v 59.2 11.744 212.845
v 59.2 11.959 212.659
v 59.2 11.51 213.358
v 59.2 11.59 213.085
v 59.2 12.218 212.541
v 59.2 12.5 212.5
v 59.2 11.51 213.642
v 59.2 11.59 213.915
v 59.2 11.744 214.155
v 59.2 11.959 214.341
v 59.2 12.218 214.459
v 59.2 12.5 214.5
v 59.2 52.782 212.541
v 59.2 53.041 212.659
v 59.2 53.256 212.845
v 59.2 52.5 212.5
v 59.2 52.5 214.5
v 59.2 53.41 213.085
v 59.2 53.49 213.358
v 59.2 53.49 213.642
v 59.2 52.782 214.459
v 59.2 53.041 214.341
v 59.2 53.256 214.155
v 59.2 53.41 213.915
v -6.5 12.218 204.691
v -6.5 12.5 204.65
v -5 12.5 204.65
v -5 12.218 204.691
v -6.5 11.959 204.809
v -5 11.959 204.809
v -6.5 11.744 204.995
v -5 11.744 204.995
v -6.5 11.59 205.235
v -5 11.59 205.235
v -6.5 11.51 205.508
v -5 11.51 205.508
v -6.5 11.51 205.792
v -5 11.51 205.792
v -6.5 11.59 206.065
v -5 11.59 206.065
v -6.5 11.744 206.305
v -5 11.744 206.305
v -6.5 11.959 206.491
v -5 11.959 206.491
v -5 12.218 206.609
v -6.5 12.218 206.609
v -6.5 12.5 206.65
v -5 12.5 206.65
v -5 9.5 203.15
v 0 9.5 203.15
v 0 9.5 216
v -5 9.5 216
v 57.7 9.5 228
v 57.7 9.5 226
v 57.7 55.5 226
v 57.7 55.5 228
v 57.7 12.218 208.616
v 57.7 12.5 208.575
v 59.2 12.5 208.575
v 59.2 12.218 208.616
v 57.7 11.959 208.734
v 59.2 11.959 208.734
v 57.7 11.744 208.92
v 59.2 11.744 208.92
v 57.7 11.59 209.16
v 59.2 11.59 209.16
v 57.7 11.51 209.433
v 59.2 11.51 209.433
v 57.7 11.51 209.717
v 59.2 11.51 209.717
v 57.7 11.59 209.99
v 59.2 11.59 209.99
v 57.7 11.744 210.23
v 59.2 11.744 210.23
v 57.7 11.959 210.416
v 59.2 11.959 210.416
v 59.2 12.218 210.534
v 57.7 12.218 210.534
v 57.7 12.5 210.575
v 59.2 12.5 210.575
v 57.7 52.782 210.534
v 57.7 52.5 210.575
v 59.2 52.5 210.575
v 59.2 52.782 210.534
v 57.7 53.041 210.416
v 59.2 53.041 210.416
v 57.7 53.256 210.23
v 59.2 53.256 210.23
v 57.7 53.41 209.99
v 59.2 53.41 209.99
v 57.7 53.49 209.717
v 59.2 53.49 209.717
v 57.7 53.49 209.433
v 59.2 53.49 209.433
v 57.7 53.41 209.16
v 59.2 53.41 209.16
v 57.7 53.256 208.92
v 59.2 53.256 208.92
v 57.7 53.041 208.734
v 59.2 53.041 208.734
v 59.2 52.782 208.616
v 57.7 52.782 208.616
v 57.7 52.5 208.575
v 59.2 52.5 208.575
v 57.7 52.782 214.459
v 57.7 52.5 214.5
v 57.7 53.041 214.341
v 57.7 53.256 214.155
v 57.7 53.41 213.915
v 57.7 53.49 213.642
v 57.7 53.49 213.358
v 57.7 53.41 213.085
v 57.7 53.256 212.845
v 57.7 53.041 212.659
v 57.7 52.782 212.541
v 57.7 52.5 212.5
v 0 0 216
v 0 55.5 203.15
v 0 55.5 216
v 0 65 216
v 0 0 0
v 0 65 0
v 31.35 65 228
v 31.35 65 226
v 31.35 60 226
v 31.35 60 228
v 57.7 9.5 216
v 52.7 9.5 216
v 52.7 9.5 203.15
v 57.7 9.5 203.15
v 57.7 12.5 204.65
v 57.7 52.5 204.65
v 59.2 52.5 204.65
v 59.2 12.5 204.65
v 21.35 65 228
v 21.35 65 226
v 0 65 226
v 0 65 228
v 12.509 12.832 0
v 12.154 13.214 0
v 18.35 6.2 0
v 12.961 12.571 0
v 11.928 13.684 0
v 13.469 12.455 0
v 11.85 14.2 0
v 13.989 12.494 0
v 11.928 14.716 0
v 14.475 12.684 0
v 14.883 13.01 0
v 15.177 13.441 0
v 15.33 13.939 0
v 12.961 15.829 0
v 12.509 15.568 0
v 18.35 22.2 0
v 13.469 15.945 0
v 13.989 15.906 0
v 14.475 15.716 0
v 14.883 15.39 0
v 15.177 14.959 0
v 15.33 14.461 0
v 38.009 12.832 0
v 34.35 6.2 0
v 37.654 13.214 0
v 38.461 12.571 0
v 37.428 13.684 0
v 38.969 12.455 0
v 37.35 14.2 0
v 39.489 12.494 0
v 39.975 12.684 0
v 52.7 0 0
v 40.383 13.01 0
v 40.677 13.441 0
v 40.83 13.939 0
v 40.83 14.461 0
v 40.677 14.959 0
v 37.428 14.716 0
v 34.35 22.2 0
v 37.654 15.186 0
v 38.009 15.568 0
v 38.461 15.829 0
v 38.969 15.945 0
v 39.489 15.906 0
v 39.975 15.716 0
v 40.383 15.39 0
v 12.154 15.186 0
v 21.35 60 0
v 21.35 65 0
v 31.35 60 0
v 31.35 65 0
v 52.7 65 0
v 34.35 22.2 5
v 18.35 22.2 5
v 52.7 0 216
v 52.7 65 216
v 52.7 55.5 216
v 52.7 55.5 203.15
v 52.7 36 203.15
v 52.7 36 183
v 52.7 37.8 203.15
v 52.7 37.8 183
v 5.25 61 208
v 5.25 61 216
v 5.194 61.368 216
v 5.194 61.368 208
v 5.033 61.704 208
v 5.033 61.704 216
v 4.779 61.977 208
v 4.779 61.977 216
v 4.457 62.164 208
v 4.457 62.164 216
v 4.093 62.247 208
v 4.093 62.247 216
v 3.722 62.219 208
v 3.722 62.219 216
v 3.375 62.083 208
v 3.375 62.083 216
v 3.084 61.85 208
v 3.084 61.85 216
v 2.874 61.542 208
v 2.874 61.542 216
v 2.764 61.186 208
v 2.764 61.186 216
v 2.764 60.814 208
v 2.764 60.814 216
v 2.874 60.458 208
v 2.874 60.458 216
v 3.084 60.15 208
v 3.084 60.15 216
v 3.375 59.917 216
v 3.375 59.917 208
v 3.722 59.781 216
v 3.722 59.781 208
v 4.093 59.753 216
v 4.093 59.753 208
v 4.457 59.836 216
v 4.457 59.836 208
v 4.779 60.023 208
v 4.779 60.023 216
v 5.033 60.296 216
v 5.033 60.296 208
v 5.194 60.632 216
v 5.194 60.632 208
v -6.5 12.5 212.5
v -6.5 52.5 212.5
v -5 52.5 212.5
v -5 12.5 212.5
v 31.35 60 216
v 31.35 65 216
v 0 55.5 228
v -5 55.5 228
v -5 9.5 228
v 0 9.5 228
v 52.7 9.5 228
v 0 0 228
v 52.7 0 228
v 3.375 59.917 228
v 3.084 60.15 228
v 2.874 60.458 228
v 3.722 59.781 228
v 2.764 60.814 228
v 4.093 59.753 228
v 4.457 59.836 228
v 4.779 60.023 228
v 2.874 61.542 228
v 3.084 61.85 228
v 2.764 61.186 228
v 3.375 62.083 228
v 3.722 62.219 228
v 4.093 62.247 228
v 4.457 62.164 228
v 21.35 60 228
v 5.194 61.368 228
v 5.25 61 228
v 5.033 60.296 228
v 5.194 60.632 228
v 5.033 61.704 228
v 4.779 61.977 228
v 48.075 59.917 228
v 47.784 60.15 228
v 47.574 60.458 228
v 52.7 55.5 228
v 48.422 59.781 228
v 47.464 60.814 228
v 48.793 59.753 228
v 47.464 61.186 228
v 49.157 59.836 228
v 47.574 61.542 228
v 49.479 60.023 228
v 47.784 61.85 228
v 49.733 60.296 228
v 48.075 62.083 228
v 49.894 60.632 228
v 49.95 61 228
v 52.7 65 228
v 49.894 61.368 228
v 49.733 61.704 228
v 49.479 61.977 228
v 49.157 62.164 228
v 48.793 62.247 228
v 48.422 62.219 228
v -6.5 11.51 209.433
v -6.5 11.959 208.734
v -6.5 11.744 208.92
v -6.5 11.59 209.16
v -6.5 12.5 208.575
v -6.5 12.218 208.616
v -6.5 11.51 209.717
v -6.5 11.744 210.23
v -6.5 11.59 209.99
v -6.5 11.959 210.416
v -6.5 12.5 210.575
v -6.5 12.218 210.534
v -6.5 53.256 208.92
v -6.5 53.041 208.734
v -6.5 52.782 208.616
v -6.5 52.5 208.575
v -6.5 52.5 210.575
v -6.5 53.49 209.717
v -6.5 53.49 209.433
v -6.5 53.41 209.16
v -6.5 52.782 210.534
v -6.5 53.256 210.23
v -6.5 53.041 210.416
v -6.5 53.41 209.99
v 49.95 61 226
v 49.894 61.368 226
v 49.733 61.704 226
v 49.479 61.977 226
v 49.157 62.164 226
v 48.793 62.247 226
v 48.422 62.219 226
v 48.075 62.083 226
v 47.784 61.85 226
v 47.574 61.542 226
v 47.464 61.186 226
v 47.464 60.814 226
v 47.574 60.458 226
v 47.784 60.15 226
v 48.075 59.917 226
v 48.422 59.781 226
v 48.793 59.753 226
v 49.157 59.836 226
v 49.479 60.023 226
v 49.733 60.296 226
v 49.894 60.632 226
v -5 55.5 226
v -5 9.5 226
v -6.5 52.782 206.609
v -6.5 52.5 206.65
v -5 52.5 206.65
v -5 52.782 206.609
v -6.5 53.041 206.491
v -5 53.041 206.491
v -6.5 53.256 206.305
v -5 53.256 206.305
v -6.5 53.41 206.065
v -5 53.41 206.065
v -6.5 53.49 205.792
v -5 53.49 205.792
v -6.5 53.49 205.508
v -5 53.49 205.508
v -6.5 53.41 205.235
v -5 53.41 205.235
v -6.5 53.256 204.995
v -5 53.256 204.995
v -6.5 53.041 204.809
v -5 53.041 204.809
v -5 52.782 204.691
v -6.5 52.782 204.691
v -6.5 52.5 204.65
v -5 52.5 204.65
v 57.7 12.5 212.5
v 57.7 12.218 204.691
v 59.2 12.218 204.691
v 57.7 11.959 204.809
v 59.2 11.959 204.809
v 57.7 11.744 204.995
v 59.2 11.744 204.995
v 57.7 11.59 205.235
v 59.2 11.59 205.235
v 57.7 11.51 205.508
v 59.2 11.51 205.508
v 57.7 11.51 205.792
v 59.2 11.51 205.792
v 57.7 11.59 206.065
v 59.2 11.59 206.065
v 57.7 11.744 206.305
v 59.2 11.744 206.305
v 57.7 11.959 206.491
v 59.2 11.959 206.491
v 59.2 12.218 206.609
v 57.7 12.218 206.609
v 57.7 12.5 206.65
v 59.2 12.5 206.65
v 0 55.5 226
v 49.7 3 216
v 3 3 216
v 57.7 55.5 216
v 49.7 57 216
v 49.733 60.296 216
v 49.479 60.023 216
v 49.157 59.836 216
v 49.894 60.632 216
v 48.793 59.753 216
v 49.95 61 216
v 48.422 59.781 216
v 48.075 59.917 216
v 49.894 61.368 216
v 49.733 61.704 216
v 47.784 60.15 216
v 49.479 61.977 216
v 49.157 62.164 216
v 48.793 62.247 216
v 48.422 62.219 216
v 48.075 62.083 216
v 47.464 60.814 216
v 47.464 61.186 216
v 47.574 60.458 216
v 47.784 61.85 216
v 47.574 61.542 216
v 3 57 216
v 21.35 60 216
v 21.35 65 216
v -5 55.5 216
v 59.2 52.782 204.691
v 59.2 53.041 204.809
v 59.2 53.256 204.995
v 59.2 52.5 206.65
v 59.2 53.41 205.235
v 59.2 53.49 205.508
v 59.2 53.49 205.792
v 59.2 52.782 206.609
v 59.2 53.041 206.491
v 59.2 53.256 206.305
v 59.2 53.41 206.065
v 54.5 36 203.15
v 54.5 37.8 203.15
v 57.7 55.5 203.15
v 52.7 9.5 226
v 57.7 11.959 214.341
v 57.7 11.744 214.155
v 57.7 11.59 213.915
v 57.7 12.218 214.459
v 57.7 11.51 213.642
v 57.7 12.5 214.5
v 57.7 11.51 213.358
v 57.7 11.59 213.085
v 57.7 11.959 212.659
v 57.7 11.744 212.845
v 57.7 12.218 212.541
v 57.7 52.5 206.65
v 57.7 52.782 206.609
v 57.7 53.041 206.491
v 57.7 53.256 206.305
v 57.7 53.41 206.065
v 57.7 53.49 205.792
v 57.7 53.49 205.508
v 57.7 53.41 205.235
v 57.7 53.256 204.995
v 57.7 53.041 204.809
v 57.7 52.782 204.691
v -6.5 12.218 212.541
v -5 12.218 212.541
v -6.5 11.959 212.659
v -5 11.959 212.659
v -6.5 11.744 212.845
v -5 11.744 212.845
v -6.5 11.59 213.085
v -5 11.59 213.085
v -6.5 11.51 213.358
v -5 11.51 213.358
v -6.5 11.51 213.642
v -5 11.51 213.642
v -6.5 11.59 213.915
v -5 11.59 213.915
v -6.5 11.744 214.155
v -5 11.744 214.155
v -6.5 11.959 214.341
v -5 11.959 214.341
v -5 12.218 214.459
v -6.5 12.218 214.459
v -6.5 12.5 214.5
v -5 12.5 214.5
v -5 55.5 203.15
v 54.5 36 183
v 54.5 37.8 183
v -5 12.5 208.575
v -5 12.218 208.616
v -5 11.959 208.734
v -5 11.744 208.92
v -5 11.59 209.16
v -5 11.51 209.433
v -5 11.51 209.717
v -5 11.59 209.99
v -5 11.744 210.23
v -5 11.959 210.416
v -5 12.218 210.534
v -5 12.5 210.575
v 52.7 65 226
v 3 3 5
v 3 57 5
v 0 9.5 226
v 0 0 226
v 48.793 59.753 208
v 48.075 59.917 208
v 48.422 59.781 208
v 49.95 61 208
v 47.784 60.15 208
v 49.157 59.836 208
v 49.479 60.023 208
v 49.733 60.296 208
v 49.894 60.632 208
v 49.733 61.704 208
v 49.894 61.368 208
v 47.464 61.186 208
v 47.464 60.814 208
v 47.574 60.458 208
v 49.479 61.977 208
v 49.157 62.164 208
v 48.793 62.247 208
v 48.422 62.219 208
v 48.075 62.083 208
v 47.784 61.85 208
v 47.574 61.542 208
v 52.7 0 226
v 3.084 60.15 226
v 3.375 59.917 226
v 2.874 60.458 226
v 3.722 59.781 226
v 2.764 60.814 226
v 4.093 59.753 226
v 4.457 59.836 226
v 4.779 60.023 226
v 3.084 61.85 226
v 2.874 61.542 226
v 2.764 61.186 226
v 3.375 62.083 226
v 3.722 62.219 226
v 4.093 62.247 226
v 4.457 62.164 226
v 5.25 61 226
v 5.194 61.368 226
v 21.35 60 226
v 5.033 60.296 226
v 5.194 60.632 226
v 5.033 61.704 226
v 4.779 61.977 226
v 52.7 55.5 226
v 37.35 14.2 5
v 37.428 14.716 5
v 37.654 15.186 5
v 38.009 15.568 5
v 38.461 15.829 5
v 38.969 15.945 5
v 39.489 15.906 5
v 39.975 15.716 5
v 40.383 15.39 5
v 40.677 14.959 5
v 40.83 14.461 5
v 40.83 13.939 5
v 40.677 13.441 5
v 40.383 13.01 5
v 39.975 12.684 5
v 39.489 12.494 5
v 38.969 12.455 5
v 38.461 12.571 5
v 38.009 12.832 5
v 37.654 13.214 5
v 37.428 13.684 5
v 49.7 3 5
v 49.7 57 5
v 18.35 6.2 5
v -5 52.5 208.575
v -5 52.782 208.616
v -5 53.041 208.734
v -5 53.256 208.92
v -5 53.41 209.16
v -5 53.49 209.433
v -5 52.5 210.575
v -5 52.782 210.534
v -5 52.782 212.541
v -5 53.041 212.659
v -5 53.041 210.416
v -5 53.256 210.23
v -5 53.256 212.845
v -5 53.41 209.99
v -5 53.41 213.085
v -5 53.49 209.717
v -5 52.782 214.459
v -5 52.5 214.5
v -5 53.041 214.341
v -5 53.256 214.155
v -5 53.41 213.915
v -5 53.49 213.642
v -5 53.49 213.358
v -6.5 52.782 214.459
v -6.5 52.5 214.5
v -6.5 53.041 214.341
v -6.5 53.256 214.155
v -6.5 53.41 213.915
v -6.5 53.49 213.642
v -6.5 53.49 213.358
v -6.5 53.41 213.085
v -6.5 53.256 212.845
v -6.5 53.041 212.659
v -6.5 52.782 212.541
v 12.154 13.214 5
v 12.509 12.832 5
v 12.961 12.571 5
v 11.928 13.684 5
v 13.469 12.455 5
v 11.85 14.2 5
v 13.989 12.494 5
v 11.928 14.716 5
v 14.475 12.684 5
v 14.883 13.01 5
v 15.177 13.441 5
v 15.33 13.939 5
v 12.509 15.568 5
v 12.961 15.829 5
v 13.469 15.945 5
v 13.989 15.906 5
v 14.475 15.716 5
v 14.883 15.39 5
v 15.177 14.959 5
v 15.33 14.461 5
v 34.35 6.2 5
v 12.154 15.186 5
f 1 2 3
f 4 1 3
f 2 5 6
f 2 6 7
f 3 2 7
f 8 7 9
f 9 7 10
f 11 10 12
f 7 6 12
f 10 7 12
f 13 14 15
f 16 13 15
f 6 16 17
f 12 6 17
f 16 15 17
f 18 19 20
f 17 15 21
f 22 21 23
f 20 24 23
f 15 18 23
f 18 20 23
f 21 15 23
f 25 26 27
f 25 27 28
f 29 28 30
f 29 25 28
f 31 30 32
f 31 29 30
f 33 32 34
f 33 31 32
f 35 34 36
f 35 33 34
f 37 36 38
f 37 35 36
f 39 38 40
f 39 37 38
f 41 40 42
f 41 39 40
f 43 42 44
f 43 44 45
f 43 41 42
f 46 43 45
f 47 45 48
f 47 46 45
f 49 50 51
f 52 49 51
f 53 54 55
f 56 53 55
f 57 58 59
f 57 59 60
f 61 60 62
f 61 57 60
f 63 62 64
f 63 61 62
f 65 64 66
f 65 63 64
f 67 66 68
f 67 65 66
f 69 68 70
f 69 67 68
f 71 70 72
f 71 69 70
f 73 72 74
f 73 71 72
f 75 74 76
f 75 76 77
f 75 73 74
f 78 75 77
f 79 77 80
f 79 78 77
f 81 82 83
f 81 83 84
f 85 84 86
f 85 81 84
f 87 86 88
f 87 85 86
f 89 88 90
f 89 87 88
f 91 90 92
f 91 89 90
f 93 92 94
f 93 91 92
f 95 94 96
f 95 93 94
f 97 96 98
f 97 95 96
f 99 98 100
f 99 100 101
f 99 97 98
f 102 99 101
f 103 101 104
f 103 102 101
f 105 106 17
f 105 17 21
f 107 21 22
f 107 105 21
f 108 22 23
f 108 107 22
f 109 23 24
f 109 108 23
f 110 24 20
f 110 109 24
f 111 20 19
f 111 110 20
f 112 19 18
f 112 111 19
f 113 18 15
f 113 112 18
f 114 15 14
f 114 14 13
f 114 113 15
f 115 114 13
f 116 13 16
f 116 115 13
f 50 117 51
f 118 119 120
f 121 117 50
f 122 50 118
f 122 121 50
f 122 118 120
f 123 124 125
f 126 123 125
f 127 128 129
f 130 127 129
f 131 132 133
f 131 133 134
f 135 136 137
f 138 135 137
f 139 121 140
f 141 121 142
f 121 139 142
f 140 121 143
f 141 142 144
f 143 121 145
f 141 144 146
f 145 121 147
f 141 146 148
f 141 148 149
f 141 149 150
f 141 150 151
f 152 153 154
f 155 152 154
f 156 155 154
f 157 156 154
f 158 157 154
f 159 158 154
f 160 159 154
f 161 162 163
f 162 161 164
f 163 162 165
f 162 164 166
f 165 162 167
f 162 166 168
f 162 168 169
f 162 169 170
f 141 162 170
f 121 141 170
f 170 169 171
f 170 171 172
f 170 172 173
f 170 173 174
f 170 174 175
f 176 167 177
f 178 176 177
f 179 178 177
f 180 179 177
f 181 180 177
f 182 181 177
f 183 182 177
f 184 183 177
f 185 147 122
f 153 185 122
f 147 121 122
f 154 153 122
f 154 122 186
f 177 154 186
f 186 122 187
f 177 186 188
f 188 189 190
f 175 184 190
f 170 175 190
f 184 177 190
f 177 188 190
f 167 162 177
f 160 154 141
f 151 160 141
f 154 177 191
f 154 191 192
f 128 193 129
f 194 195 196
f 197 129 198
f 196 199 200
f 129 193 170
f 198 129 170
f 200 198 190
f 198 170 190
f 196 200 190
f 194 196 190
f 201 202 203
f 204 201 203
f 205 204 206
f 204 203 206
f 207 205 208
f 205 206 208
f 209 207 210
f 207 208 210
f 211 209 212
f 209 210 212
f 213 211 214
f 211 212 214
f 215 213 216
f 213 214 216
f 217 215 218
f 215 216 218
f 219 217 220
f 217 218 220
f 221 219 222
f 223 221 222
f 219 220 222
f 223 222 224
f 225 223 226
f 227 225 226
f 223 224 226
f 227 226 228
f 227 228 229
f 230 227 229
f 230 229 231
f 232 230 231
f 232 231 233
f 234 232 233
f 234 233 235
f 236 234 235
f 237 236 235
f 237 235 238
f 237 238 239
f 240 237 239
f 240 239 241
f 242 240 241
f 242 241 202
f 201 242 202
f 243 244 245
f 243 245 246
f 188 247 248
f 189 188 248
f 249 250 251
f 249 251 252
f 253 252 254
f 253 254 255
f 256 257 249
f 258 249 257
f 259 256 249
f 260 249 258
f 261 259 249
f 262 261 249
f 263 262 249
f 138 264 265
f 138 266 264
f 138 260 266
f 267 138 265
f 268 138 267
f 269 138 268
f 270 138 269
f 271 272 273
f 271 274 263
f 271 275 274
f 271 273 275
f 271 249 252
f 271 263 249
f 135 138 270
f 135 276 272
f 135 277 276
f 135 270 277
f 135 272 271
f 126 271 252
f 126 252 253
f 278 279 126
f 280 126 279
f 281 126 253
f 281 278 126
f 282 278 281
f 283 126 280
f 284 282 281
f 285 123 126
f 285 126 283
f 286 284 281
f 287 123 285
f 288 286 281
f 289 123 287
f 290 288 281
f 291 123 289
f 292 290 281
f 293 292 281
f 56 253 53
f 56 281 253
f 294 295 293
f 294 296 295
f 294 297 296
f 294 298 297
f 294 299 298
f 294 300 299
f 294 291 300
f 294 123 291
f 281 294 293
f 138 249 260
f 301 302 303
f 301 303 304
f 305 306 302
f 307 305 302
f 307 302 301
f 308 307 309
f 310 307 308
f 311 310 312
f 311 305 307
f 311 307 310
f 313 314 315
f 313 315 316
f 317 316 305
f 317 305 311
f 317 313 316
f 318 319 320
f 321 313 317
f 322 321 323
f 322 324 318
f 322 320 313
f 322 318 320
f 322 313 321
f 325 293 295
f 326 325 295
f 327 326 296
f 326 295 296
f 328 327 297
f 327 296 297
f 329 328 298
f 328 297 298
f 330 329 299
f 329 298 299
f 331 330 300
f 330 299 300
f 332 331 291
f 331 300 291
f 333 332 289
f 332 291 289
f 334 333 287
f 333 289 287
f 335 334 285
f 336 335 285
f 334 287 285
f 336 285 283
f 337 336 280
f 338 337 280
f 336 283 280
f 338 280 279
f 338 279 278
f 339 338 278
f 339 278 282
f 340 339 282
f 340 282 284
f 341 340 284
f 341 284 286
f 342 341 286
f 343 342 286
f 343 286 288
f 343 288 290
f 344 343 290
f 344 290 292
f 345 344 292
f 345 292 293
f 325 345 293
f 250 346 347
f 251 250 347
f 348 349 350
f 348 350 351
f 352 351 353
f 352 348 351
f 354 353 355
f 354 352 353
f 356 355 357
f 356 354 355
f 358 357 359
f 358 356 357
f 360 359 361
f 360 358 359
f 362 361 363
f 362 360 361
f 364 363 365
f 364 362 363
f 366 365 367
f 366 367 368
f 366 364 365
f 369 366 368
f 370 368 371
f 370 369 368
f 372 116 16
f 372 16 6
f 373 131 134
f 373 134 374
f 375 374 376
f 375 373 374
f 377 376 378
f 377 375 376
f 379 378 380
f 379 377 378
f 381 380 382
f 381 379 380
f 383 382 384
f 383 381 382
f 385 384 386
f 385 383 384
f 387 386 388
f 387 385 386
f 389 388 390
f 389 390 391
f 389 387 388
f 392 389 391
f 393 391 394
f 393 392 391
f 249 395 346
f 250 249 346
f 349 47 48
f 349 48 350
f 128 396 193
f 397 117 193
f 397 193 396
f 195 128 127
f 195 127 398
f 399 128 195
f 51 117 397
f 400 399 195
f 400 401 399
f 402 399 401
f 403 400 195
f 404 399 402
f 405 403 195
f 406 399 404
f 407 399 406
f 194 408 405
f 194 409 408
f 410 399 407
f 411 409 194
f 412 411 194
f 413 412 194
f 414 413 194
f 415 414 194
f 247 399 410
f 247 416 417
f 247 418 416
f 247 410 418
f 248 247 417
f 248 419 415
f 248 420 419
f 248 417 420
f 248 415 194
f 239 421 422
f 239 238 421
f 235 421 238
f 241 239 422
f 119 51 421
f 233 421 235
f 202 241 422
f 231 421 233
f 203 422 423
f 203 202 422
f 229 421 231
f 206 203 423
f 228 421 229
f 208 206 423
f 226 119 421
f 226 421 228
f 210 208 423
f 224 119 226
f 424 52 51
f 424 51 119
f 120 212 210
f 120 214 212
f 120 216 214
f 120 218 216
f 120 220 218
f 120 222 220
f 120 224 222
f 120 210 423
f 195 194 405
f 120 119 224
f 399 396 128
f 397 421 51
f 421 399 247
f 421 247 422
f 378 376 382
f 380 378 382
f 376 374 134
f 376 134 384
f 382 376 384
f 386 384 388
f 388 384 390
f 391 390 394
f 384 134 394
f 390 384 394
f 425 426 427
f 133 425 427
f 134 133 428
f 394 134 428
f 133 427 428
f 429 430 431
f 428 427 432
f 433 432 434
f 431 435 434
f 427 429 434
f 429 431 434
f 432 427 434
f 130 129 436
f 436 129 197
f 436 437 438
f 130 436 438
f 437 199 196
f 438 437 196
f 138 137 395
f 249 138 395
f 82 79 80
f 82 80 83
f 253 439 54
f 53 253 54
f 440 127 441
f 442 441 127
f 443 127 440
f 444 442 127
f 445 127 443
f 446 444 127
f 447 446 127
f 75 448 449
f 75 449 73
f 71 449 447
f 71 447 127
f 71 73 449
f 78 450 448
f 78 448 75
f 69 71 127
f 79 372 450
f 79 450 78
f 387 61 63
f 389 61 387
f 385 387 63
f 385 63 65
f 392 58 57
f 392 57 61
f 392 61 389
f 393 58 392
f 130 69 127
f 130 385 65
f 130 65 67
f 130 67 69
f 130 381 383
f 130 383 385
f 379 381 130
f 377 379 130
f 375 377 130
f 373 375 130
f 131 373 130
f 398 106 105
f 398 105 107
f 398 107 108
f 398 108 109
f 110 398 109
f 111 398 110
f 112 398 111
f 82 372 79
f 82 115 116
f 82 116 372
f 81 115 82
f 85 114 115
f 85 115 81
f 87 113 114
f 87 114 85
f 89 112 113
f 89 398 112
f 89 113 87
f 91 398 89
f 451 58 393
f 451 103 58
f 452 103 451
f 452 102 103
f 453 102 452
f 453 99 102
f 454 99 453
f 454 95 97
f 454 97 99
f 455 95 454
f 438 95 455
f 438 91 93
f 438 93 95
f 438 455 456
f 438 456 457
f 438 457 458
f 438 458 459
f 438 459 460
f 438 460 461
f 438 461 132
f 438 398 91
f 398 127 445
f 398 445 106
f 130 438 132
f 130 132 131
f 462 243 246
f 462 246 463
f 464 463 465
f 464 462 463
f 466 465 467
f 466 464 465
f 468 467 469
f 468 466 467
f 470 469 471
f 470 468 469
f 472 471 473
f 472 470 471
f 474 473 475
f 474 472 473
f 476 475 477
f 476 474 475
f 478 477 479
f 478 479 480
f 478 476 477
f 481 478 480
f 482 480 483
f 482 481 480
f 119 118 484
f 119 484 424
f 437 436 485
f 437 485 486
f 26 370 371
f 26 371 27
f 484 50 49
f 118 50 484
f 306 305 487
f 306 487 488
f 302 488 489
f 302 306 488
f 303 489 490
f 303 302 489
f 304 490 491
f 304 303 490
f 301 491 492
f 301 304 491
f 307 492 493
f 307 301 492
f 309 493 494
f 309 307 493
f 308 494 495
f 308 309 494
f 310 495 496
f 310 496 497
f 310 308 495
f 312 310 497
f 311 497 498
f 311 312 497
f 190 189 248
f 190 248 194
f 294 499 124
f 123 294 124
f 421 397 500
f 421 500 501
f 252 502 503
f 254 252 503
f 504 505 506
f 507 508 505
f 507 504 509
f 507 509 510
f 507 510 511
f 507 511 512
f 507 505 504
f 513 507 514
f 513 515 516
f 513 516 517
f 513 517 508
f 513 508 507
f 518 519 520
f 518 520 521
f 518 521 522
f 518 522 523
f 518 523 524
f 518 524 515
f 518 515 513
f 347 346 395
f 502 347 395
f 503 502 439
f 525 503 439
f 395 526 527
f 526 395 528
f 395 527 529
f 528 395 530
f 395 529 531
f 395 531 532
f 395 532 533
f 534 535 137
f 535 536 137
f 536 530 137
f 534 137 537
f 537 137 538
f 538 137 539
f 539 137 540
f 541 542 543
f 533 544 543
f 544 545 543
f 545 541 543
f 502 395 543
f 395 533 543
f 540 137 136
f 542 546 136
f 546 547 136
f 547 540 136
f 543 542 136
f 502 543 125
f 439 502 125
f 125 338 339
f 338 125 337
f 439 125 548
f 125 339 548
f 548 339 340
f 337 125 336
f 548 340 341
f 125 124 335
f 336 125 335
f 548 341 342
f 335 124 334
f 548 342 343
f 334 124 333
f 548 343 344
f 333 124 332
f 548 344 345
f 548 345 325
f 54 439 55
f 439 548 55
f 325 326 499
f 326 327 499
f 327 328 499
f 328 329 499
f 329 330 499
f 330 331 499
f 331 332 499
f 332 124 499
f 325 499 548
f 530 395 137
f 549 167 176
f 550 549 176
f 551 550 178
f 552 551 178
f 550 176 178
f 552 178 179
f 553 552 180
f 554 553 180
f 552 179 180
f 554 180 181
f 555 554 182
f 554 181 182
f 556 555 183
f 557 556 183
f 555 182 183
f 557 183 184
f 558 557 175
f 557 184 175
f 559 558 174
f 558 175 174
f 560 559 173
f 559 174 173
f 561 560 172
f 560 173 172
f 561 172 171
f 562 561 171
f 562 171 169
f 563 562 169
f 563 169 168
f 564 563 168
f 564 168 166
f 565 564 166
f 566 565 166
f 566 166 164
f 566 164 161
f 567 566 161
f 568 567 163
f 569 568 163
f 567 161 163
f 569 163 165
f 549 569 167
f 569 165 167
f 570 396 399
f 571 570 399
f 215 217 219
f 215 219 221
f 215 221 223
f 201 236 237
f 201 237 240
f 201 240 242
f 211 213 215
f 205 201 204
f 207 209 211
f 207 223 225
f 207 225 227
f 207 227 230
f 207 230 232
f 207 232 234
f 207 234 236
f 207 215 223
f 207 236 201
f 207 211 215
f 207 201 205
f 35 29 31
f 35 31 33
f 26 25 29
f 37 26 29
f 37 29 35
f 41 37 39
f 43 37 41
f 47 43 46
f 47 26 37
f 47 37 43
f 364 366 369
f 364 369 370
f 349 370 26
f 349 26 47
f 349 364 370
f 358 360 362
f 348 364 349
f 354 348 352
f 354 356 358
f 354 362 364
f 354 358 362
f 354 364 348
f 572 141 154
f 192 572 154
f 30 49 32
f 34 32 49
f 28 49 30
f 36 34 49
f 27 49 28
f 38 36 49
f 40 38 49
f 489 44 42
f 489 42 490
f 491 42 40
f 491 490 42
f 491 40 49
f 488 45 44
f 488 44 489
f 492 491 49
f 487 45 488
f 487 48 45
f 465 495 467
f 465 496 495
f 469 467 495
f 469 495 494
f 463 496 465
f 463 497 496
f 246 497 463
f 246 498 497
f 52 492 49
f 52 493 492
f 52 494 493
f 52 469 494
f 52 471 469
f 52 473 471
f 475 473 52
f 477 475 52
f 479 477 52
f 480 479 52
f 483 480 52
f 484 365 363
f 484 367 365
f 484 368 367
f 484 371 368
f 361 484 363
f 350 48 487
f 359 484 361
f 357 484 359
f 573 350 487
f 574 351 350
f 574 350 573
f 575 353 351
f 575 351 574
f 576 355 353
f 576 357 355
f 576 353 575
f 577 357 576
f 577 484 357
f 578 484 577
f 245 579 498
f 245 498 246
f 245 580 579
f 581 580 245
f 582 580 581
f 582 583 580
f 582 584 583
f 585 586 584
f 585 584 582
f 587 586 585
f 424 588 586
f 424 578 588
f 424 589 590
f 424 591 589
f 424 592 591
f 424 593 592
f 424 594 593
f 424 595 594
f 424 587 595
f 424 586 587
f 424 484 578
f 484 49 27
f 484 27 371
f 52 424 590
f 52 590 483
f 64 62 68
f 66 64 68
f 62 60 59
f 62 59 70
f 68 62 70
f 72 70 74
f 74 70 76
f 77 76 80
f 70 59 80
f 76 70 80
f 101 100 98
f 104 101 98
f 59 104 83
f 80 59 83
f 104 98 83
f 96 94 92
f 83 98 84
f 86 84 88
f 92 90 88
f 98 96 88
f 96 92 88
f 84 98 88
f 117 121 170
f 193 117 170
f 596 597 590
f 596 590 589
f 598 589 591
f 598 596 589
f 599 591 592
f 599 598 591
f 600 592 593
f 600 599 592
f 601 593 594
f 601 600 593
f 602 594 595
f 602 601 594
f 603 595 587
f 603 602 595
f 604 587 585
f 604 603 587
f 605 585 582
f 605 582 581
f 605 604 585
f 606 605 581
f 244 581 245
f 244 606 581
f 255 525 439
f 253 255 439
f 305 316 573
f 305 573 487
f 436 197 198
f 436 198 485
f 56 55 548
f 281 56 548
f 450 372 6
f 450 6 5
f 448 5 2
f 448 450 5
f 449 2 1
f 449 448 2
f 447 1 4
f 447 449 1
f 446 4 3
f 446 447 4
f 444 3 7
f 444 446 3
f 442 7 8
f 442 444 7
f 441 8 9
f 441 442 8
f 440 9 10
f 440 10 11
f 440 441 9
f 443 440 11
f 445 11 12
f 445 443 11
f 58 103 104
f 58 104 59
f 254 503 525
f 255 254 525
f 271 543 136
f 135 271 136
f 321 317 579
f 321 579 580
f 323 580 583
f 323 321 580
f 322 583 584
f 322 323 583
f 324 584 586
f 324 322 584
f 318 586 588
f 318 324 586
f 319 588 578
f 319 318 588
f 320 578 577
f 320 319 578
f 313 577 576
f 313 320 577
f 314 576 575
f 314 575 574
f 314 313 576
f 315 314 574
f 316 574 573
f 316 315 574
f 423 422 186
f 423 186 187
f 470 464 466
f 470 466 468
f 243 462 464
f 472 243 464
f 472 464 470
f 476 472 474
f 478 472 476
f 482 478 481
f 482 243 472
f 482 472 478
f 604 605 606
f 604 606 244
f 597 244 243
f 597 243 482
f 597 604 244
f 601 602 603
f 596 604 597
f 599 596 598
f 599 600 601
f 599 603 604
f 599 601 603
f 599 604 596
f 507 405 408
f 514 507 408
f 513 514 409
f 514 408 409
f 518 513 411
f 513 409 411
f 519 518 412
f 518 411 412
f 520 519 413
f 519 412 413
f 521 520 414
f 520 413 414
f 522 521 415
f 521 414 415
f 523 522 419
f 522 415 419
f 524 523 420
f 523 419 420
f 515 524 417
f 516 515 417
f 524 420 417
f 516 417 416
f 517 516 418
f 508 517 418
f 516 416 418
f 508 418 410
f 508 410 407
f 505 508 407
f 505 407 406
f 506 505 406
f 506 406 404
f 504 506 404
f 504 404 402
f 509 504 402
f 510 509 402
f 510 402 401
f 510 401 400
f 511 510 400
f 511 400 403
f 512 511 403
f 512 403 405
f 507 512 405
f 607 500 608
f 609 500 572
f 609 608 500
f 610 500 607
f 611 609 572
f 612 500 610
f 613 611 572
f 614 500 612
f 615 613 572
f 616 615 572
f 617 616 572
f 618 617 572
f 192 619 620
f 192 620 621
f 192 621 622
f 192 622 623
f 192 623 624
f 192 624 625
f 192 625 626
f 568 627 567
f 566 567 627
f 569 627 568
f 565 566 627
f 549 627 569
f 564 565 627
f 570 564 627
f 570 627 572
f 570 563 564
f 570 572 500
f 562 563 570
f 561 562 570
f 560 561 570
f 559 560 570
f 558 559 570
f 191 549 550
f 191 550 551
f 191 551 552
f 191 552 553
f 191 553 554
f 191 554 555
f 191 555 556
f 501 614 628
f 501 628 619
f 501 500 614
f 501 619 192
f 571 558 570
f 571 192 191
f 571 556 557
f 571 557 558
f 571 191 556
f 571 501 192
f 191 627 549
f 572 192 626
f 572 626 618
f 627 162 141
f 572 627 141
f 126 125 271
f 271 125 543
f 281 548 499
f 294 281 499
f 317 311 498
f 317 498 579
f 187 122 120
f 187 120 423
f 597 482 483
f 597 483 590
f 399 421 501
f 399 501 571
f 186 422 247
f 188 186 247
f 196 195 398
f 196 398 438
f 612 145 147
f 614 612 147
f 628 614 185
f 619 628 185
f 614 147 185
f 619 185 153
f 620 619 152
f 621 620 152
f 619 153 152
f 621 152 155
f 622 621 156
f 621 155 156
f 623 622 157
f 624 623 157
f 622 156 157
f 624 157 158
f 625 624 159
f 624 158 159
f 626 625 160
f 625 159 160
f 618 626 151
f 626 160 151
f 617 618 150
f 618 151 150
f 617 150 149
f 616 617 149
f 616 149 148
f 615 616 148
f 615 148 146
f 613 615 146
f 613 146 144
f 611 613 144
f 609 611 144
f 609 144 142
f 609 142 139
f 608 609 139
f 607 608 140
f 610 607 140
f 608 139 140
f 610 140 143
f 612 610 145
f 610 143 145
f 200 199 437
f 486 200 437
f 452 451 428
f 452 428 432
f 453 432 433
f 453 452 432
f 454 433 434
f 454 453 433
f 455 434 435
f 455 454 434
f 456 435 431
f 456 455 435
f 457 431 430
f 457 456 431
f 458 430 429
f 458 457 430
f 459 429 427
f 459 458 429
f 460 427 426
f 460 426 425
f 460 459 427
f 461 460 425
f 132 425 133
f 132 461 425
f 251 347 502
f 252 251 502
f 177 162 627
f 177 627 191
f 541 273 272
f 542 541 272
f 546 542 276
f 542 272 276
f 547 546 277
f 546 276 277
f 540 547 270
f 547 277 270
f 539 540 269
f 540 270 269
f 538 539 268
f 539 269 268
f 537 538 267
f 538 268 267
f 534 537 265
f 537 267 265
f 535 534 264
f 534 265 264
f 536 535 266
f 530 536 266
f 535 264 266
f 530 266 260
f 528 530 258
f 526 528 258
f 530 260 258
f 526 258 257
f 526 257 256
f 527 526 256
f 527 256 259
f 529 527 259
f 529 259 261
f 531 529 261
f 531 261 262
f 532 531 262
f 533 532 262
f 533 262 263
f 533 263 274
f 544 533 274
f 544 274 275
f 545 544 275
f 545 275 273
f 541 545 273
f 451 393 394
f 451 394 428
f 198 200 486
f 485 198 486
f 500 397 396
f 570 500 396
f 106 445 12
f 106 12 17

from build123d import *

# Parameters (mm, degrees)
SKETCH_1_W          = 52.7
SKETCH_1_H          = 65
EXTRUDE_1_DEPTH     = 216
SKETCH_2_W          = 10
SKETCH_2_H          = 5
CUT_EXTRUDE_1_DEPTH = 232.642591075
SKETCH_3_W          = 46.7
SKETCH_3_H          = 54
CUT_EXTRUDE_2_DEPTH = 211
SKETCH_6_R          = 1.75
SKETCH_6_W          = 16
SKETCH_6_H          = 16
CUT_EXTRUDE_3_DEPTH = 5
SKETCH_7_W          = 1.8
SKETCH_7_H          = 1.8
EXTRUDE_2_DEPTH     = 33
SKETCH_9_W          = 12.85
SKETCH_9_H          = 46
EXTRUDE_3_DEPTH     = 5
SKETCH_10_W         = 12.85
SKETCH_10_H         = 46
EXTRUDE_4_DEPTH     = 5
EXTRUDE_5_DEPTH     = 1.5
EXTRUDE_START       = 1.5
EXTRUDE_6_DEPTH     = 1.5
EXTRUDE_7_DEPTH     = 2
SKETCH_15_R         = 1.25
CUT_EXTRUDE_4_DEPTH = 20


with BuildPart() as part:
    # 草图1 → 凸台-拉伸1 (new body)
    with BuildSketch(Plane.XY):
        with Locations((26.35, 32.5)):
            Rectangle(SKETCH_1_W, SKETCH_1_H)
    extrude(amount=EXTRUDE_1_DEPTH)

    # 草图2 → 切除-拉伸1 (cut, through all)
    with BuildSketch(Plane.XY.offset(216)):
        with Locations((26.35, 62.5)):
            Rectangle(SKETCH_2_W, SKETCH_2_H)
    extrude(amount=-CUT_EXTRUDE_1_DEPTH, mode=Mode.SUBTRACT)

    # 草图3 → 切除-拉伸2 (cut)
    with BuildSketch(Plane.XY.offset(216)):
        with Locations((26.35, 30)):
            Rectangle(SKETCH_3_W, SKETCH_3_H)
    extrude(amount=-CUT_EXTRUDE_2_DEPTH, mode=Mode.SUBTRACT)

    # 草图6 → 切除-拉伸3 (cut)
    with BuildSketch(Plane(origin=(0, 0, 0), x_dir=(-1, 0, 0), z_dir=(0, 0, -1))):
        with Locations((-13.6, 14.2)):
            Circle(SKETCH_6_R)
        with Locations((-39.1, 14.2)):
            Circle(SKETCH_6_R)
        with Locations((-26.35, 14.2)):
            Rectangle(SKETCH_6_W, SKETCH_6_H)
    extrude(amount=-CUT_EXTRUDE_3_DEPTH, mode=Mode.SUBTRACT)

    # 草图7 → 凸台-拉伸2 (add)
    with BuildSketch(Plane.XY.offset(216)):
        with Locations((53.6, 36.9)):
            Rectangle(SKETCH_7_W, SKETCH_7_H)
    extrude(amount=-EXTRUDE_2_DEPTH)

    # 草图9 → 凸台-拉伸3 (add)
    with BuildSketch(Plane.ZY):
        with Locations((209.575, 32.5)):
            Rectangle(SKETCH_9_W, SKETCH_9_H)
    extrude(amount=EXTRUDE_3_DEPTH)

    # 草图10 → 凸台-拉伸4 (add)
    with BuildSketch(Plane(origin=(52.7, 0, 0), x_dir=(0, 0, -1), z_dir=(1, 0, 0))):
        with Locations((-209.575, 32.5)):
            Rectangle(SKETCH_10_W, SKETCH_10_H)
    extrude(amount=EXTRUDE_4_DEPTH)

    # 草图11 → 凸台-拉伸5 (add)
    with BuildSketch(Plane(origin=(57.7, 0, 0), x_dir=(0, 0, -1), z_dir=(1, 0, 0))):
        with BuildLine():
            Line((-214.5, 12.5), (-214.5, 52.5))
            ThreePointArc((-214.5, 52.5), (-213.5, 53.5), (-212.5, 52.5))
            Line((-212.5, 52.5), (-212.5, 12.5))
            ThreePointArc((-212.5, 12.5), (-213.5, 11.5), (-214.5, 12.5))
        make_face()
        with BuildLine():
            Line((-210.575, 12.5), (-210.575, 52.5))
            ThreePointArc((-210.575, 52.5), (-209.575, 53.5), (-208.575, 52.5))
            Line((-208.575, 52.5), (-208.575, 12.5))
            ThreePointArc((-208.575, 12.5), (-209.575, 11.5), (-210.575, 12.5))
        make_face()
        with BuildLine():
            Line((-206.65, 12.5), (-206.65, 52.5))
            ThreePointArc((-206.65, 52.5), (-205.65, 53.5), (-204.65, 52.5))
            Line((-204.65, 52.5), (-204.65, 12.5))
            ThreePointArc((-204.65, 12.5), (-205.65, 11.5), (-206.65, 12.5))
        make_face()
    extrude(amount=EXTRUDE_5_DEPTH)

    # 草图12 → 凸台-拉伸6 (add)
    with BuildSketch(Plane.ZY.offset(5).offset(EXTRUDE_START)):
        with BuildLine():
            Line((214.5, 12.5), (214.5, 52.5))
            ThreePointArc((214.5, 52.5), (213.5, 53.5), (212.5, 52.5))
            Line((212.5, 52.5), (212.5, 12.5))
            ThreePointArc((212.5, 12.5), (213.5, 11.5), (214.5, 12.5))
        make_face()
        with BuildLine():
            Line((206.65, 12.5), (206.65, 52.5))
            ThreePointArc((206.65, 52.5), (205.65, 53.5), (204.65, 52.5))
            Line((204.65, 52.5), (204.65, 12.5))
            ThreePointArc((204.65, 12.5), (205.65, 11.5), (206.65, 12.5))
        make_face()
        with BuildLine():
            Line((210.575, 12.5), (210.575, 52.5))
            ThreePointArc((210.575, 52.5), (209.575, 53.5), (208.575, 52.5))
            Line((208.575, 52.5), (208.575, 12.5))
            ThreePointArc((208.575, 12.5), (209.575, 11.5), (210.575, 12.5))
        make_face()
    extrude(amount=-EXTRUDE_6_DEPTH)


with BuildPart() as body_2:
    # 草图14 → 凸台-拉伸7 (new body)
    with BuildSketch(Plane.XY.offset(226)):
        Polygon((57.7, 55.5), (52.7, 55.5), (52.7, 65), (31.35, 65), (31.35, 60), (21.35, 60), (21.35, 65), (0, 65), (0, 55.5), (-5, 55.5), (-5, 9.5), (0, 9.5), (0, 0), (52.7, 0), (52.7, 9.5), (57.7, 9.5), align=None)
    extrude(amount=EXTRUDE_7_DEPTH)


with BuildPart() as cut_extrude_4_tool:
    # 草图15 → 切除-拉伸4 (new body)
    with BuildSketch(Plane.XY.offset(228)):
        with Locations((4, 61)):
            Circle(SKETCH_15_R)
        with Locations((48.7, 61)):
            Circle(SKETCH_15_R)
    extrude(amount=-CUT_EXTRUDE_4_DEPTH)


with BuildPart() as part_1:
    add(part.part)

    # 切除-拉伸4: cut by cut_extrude_4_tool
    add(cut_extrude_4_tool.part, mode=Mode.SUBTRACT)


with BuildPart() as body_2_1:
    add(body_2.part)

    # 切除-拉伸4: cut by cut_extrude_4_tool
    add(cut_extrude_4_tool.part, mode=Mode.SUBTRACT)


solid = Compound([part_1.part, body_2_1.part])
